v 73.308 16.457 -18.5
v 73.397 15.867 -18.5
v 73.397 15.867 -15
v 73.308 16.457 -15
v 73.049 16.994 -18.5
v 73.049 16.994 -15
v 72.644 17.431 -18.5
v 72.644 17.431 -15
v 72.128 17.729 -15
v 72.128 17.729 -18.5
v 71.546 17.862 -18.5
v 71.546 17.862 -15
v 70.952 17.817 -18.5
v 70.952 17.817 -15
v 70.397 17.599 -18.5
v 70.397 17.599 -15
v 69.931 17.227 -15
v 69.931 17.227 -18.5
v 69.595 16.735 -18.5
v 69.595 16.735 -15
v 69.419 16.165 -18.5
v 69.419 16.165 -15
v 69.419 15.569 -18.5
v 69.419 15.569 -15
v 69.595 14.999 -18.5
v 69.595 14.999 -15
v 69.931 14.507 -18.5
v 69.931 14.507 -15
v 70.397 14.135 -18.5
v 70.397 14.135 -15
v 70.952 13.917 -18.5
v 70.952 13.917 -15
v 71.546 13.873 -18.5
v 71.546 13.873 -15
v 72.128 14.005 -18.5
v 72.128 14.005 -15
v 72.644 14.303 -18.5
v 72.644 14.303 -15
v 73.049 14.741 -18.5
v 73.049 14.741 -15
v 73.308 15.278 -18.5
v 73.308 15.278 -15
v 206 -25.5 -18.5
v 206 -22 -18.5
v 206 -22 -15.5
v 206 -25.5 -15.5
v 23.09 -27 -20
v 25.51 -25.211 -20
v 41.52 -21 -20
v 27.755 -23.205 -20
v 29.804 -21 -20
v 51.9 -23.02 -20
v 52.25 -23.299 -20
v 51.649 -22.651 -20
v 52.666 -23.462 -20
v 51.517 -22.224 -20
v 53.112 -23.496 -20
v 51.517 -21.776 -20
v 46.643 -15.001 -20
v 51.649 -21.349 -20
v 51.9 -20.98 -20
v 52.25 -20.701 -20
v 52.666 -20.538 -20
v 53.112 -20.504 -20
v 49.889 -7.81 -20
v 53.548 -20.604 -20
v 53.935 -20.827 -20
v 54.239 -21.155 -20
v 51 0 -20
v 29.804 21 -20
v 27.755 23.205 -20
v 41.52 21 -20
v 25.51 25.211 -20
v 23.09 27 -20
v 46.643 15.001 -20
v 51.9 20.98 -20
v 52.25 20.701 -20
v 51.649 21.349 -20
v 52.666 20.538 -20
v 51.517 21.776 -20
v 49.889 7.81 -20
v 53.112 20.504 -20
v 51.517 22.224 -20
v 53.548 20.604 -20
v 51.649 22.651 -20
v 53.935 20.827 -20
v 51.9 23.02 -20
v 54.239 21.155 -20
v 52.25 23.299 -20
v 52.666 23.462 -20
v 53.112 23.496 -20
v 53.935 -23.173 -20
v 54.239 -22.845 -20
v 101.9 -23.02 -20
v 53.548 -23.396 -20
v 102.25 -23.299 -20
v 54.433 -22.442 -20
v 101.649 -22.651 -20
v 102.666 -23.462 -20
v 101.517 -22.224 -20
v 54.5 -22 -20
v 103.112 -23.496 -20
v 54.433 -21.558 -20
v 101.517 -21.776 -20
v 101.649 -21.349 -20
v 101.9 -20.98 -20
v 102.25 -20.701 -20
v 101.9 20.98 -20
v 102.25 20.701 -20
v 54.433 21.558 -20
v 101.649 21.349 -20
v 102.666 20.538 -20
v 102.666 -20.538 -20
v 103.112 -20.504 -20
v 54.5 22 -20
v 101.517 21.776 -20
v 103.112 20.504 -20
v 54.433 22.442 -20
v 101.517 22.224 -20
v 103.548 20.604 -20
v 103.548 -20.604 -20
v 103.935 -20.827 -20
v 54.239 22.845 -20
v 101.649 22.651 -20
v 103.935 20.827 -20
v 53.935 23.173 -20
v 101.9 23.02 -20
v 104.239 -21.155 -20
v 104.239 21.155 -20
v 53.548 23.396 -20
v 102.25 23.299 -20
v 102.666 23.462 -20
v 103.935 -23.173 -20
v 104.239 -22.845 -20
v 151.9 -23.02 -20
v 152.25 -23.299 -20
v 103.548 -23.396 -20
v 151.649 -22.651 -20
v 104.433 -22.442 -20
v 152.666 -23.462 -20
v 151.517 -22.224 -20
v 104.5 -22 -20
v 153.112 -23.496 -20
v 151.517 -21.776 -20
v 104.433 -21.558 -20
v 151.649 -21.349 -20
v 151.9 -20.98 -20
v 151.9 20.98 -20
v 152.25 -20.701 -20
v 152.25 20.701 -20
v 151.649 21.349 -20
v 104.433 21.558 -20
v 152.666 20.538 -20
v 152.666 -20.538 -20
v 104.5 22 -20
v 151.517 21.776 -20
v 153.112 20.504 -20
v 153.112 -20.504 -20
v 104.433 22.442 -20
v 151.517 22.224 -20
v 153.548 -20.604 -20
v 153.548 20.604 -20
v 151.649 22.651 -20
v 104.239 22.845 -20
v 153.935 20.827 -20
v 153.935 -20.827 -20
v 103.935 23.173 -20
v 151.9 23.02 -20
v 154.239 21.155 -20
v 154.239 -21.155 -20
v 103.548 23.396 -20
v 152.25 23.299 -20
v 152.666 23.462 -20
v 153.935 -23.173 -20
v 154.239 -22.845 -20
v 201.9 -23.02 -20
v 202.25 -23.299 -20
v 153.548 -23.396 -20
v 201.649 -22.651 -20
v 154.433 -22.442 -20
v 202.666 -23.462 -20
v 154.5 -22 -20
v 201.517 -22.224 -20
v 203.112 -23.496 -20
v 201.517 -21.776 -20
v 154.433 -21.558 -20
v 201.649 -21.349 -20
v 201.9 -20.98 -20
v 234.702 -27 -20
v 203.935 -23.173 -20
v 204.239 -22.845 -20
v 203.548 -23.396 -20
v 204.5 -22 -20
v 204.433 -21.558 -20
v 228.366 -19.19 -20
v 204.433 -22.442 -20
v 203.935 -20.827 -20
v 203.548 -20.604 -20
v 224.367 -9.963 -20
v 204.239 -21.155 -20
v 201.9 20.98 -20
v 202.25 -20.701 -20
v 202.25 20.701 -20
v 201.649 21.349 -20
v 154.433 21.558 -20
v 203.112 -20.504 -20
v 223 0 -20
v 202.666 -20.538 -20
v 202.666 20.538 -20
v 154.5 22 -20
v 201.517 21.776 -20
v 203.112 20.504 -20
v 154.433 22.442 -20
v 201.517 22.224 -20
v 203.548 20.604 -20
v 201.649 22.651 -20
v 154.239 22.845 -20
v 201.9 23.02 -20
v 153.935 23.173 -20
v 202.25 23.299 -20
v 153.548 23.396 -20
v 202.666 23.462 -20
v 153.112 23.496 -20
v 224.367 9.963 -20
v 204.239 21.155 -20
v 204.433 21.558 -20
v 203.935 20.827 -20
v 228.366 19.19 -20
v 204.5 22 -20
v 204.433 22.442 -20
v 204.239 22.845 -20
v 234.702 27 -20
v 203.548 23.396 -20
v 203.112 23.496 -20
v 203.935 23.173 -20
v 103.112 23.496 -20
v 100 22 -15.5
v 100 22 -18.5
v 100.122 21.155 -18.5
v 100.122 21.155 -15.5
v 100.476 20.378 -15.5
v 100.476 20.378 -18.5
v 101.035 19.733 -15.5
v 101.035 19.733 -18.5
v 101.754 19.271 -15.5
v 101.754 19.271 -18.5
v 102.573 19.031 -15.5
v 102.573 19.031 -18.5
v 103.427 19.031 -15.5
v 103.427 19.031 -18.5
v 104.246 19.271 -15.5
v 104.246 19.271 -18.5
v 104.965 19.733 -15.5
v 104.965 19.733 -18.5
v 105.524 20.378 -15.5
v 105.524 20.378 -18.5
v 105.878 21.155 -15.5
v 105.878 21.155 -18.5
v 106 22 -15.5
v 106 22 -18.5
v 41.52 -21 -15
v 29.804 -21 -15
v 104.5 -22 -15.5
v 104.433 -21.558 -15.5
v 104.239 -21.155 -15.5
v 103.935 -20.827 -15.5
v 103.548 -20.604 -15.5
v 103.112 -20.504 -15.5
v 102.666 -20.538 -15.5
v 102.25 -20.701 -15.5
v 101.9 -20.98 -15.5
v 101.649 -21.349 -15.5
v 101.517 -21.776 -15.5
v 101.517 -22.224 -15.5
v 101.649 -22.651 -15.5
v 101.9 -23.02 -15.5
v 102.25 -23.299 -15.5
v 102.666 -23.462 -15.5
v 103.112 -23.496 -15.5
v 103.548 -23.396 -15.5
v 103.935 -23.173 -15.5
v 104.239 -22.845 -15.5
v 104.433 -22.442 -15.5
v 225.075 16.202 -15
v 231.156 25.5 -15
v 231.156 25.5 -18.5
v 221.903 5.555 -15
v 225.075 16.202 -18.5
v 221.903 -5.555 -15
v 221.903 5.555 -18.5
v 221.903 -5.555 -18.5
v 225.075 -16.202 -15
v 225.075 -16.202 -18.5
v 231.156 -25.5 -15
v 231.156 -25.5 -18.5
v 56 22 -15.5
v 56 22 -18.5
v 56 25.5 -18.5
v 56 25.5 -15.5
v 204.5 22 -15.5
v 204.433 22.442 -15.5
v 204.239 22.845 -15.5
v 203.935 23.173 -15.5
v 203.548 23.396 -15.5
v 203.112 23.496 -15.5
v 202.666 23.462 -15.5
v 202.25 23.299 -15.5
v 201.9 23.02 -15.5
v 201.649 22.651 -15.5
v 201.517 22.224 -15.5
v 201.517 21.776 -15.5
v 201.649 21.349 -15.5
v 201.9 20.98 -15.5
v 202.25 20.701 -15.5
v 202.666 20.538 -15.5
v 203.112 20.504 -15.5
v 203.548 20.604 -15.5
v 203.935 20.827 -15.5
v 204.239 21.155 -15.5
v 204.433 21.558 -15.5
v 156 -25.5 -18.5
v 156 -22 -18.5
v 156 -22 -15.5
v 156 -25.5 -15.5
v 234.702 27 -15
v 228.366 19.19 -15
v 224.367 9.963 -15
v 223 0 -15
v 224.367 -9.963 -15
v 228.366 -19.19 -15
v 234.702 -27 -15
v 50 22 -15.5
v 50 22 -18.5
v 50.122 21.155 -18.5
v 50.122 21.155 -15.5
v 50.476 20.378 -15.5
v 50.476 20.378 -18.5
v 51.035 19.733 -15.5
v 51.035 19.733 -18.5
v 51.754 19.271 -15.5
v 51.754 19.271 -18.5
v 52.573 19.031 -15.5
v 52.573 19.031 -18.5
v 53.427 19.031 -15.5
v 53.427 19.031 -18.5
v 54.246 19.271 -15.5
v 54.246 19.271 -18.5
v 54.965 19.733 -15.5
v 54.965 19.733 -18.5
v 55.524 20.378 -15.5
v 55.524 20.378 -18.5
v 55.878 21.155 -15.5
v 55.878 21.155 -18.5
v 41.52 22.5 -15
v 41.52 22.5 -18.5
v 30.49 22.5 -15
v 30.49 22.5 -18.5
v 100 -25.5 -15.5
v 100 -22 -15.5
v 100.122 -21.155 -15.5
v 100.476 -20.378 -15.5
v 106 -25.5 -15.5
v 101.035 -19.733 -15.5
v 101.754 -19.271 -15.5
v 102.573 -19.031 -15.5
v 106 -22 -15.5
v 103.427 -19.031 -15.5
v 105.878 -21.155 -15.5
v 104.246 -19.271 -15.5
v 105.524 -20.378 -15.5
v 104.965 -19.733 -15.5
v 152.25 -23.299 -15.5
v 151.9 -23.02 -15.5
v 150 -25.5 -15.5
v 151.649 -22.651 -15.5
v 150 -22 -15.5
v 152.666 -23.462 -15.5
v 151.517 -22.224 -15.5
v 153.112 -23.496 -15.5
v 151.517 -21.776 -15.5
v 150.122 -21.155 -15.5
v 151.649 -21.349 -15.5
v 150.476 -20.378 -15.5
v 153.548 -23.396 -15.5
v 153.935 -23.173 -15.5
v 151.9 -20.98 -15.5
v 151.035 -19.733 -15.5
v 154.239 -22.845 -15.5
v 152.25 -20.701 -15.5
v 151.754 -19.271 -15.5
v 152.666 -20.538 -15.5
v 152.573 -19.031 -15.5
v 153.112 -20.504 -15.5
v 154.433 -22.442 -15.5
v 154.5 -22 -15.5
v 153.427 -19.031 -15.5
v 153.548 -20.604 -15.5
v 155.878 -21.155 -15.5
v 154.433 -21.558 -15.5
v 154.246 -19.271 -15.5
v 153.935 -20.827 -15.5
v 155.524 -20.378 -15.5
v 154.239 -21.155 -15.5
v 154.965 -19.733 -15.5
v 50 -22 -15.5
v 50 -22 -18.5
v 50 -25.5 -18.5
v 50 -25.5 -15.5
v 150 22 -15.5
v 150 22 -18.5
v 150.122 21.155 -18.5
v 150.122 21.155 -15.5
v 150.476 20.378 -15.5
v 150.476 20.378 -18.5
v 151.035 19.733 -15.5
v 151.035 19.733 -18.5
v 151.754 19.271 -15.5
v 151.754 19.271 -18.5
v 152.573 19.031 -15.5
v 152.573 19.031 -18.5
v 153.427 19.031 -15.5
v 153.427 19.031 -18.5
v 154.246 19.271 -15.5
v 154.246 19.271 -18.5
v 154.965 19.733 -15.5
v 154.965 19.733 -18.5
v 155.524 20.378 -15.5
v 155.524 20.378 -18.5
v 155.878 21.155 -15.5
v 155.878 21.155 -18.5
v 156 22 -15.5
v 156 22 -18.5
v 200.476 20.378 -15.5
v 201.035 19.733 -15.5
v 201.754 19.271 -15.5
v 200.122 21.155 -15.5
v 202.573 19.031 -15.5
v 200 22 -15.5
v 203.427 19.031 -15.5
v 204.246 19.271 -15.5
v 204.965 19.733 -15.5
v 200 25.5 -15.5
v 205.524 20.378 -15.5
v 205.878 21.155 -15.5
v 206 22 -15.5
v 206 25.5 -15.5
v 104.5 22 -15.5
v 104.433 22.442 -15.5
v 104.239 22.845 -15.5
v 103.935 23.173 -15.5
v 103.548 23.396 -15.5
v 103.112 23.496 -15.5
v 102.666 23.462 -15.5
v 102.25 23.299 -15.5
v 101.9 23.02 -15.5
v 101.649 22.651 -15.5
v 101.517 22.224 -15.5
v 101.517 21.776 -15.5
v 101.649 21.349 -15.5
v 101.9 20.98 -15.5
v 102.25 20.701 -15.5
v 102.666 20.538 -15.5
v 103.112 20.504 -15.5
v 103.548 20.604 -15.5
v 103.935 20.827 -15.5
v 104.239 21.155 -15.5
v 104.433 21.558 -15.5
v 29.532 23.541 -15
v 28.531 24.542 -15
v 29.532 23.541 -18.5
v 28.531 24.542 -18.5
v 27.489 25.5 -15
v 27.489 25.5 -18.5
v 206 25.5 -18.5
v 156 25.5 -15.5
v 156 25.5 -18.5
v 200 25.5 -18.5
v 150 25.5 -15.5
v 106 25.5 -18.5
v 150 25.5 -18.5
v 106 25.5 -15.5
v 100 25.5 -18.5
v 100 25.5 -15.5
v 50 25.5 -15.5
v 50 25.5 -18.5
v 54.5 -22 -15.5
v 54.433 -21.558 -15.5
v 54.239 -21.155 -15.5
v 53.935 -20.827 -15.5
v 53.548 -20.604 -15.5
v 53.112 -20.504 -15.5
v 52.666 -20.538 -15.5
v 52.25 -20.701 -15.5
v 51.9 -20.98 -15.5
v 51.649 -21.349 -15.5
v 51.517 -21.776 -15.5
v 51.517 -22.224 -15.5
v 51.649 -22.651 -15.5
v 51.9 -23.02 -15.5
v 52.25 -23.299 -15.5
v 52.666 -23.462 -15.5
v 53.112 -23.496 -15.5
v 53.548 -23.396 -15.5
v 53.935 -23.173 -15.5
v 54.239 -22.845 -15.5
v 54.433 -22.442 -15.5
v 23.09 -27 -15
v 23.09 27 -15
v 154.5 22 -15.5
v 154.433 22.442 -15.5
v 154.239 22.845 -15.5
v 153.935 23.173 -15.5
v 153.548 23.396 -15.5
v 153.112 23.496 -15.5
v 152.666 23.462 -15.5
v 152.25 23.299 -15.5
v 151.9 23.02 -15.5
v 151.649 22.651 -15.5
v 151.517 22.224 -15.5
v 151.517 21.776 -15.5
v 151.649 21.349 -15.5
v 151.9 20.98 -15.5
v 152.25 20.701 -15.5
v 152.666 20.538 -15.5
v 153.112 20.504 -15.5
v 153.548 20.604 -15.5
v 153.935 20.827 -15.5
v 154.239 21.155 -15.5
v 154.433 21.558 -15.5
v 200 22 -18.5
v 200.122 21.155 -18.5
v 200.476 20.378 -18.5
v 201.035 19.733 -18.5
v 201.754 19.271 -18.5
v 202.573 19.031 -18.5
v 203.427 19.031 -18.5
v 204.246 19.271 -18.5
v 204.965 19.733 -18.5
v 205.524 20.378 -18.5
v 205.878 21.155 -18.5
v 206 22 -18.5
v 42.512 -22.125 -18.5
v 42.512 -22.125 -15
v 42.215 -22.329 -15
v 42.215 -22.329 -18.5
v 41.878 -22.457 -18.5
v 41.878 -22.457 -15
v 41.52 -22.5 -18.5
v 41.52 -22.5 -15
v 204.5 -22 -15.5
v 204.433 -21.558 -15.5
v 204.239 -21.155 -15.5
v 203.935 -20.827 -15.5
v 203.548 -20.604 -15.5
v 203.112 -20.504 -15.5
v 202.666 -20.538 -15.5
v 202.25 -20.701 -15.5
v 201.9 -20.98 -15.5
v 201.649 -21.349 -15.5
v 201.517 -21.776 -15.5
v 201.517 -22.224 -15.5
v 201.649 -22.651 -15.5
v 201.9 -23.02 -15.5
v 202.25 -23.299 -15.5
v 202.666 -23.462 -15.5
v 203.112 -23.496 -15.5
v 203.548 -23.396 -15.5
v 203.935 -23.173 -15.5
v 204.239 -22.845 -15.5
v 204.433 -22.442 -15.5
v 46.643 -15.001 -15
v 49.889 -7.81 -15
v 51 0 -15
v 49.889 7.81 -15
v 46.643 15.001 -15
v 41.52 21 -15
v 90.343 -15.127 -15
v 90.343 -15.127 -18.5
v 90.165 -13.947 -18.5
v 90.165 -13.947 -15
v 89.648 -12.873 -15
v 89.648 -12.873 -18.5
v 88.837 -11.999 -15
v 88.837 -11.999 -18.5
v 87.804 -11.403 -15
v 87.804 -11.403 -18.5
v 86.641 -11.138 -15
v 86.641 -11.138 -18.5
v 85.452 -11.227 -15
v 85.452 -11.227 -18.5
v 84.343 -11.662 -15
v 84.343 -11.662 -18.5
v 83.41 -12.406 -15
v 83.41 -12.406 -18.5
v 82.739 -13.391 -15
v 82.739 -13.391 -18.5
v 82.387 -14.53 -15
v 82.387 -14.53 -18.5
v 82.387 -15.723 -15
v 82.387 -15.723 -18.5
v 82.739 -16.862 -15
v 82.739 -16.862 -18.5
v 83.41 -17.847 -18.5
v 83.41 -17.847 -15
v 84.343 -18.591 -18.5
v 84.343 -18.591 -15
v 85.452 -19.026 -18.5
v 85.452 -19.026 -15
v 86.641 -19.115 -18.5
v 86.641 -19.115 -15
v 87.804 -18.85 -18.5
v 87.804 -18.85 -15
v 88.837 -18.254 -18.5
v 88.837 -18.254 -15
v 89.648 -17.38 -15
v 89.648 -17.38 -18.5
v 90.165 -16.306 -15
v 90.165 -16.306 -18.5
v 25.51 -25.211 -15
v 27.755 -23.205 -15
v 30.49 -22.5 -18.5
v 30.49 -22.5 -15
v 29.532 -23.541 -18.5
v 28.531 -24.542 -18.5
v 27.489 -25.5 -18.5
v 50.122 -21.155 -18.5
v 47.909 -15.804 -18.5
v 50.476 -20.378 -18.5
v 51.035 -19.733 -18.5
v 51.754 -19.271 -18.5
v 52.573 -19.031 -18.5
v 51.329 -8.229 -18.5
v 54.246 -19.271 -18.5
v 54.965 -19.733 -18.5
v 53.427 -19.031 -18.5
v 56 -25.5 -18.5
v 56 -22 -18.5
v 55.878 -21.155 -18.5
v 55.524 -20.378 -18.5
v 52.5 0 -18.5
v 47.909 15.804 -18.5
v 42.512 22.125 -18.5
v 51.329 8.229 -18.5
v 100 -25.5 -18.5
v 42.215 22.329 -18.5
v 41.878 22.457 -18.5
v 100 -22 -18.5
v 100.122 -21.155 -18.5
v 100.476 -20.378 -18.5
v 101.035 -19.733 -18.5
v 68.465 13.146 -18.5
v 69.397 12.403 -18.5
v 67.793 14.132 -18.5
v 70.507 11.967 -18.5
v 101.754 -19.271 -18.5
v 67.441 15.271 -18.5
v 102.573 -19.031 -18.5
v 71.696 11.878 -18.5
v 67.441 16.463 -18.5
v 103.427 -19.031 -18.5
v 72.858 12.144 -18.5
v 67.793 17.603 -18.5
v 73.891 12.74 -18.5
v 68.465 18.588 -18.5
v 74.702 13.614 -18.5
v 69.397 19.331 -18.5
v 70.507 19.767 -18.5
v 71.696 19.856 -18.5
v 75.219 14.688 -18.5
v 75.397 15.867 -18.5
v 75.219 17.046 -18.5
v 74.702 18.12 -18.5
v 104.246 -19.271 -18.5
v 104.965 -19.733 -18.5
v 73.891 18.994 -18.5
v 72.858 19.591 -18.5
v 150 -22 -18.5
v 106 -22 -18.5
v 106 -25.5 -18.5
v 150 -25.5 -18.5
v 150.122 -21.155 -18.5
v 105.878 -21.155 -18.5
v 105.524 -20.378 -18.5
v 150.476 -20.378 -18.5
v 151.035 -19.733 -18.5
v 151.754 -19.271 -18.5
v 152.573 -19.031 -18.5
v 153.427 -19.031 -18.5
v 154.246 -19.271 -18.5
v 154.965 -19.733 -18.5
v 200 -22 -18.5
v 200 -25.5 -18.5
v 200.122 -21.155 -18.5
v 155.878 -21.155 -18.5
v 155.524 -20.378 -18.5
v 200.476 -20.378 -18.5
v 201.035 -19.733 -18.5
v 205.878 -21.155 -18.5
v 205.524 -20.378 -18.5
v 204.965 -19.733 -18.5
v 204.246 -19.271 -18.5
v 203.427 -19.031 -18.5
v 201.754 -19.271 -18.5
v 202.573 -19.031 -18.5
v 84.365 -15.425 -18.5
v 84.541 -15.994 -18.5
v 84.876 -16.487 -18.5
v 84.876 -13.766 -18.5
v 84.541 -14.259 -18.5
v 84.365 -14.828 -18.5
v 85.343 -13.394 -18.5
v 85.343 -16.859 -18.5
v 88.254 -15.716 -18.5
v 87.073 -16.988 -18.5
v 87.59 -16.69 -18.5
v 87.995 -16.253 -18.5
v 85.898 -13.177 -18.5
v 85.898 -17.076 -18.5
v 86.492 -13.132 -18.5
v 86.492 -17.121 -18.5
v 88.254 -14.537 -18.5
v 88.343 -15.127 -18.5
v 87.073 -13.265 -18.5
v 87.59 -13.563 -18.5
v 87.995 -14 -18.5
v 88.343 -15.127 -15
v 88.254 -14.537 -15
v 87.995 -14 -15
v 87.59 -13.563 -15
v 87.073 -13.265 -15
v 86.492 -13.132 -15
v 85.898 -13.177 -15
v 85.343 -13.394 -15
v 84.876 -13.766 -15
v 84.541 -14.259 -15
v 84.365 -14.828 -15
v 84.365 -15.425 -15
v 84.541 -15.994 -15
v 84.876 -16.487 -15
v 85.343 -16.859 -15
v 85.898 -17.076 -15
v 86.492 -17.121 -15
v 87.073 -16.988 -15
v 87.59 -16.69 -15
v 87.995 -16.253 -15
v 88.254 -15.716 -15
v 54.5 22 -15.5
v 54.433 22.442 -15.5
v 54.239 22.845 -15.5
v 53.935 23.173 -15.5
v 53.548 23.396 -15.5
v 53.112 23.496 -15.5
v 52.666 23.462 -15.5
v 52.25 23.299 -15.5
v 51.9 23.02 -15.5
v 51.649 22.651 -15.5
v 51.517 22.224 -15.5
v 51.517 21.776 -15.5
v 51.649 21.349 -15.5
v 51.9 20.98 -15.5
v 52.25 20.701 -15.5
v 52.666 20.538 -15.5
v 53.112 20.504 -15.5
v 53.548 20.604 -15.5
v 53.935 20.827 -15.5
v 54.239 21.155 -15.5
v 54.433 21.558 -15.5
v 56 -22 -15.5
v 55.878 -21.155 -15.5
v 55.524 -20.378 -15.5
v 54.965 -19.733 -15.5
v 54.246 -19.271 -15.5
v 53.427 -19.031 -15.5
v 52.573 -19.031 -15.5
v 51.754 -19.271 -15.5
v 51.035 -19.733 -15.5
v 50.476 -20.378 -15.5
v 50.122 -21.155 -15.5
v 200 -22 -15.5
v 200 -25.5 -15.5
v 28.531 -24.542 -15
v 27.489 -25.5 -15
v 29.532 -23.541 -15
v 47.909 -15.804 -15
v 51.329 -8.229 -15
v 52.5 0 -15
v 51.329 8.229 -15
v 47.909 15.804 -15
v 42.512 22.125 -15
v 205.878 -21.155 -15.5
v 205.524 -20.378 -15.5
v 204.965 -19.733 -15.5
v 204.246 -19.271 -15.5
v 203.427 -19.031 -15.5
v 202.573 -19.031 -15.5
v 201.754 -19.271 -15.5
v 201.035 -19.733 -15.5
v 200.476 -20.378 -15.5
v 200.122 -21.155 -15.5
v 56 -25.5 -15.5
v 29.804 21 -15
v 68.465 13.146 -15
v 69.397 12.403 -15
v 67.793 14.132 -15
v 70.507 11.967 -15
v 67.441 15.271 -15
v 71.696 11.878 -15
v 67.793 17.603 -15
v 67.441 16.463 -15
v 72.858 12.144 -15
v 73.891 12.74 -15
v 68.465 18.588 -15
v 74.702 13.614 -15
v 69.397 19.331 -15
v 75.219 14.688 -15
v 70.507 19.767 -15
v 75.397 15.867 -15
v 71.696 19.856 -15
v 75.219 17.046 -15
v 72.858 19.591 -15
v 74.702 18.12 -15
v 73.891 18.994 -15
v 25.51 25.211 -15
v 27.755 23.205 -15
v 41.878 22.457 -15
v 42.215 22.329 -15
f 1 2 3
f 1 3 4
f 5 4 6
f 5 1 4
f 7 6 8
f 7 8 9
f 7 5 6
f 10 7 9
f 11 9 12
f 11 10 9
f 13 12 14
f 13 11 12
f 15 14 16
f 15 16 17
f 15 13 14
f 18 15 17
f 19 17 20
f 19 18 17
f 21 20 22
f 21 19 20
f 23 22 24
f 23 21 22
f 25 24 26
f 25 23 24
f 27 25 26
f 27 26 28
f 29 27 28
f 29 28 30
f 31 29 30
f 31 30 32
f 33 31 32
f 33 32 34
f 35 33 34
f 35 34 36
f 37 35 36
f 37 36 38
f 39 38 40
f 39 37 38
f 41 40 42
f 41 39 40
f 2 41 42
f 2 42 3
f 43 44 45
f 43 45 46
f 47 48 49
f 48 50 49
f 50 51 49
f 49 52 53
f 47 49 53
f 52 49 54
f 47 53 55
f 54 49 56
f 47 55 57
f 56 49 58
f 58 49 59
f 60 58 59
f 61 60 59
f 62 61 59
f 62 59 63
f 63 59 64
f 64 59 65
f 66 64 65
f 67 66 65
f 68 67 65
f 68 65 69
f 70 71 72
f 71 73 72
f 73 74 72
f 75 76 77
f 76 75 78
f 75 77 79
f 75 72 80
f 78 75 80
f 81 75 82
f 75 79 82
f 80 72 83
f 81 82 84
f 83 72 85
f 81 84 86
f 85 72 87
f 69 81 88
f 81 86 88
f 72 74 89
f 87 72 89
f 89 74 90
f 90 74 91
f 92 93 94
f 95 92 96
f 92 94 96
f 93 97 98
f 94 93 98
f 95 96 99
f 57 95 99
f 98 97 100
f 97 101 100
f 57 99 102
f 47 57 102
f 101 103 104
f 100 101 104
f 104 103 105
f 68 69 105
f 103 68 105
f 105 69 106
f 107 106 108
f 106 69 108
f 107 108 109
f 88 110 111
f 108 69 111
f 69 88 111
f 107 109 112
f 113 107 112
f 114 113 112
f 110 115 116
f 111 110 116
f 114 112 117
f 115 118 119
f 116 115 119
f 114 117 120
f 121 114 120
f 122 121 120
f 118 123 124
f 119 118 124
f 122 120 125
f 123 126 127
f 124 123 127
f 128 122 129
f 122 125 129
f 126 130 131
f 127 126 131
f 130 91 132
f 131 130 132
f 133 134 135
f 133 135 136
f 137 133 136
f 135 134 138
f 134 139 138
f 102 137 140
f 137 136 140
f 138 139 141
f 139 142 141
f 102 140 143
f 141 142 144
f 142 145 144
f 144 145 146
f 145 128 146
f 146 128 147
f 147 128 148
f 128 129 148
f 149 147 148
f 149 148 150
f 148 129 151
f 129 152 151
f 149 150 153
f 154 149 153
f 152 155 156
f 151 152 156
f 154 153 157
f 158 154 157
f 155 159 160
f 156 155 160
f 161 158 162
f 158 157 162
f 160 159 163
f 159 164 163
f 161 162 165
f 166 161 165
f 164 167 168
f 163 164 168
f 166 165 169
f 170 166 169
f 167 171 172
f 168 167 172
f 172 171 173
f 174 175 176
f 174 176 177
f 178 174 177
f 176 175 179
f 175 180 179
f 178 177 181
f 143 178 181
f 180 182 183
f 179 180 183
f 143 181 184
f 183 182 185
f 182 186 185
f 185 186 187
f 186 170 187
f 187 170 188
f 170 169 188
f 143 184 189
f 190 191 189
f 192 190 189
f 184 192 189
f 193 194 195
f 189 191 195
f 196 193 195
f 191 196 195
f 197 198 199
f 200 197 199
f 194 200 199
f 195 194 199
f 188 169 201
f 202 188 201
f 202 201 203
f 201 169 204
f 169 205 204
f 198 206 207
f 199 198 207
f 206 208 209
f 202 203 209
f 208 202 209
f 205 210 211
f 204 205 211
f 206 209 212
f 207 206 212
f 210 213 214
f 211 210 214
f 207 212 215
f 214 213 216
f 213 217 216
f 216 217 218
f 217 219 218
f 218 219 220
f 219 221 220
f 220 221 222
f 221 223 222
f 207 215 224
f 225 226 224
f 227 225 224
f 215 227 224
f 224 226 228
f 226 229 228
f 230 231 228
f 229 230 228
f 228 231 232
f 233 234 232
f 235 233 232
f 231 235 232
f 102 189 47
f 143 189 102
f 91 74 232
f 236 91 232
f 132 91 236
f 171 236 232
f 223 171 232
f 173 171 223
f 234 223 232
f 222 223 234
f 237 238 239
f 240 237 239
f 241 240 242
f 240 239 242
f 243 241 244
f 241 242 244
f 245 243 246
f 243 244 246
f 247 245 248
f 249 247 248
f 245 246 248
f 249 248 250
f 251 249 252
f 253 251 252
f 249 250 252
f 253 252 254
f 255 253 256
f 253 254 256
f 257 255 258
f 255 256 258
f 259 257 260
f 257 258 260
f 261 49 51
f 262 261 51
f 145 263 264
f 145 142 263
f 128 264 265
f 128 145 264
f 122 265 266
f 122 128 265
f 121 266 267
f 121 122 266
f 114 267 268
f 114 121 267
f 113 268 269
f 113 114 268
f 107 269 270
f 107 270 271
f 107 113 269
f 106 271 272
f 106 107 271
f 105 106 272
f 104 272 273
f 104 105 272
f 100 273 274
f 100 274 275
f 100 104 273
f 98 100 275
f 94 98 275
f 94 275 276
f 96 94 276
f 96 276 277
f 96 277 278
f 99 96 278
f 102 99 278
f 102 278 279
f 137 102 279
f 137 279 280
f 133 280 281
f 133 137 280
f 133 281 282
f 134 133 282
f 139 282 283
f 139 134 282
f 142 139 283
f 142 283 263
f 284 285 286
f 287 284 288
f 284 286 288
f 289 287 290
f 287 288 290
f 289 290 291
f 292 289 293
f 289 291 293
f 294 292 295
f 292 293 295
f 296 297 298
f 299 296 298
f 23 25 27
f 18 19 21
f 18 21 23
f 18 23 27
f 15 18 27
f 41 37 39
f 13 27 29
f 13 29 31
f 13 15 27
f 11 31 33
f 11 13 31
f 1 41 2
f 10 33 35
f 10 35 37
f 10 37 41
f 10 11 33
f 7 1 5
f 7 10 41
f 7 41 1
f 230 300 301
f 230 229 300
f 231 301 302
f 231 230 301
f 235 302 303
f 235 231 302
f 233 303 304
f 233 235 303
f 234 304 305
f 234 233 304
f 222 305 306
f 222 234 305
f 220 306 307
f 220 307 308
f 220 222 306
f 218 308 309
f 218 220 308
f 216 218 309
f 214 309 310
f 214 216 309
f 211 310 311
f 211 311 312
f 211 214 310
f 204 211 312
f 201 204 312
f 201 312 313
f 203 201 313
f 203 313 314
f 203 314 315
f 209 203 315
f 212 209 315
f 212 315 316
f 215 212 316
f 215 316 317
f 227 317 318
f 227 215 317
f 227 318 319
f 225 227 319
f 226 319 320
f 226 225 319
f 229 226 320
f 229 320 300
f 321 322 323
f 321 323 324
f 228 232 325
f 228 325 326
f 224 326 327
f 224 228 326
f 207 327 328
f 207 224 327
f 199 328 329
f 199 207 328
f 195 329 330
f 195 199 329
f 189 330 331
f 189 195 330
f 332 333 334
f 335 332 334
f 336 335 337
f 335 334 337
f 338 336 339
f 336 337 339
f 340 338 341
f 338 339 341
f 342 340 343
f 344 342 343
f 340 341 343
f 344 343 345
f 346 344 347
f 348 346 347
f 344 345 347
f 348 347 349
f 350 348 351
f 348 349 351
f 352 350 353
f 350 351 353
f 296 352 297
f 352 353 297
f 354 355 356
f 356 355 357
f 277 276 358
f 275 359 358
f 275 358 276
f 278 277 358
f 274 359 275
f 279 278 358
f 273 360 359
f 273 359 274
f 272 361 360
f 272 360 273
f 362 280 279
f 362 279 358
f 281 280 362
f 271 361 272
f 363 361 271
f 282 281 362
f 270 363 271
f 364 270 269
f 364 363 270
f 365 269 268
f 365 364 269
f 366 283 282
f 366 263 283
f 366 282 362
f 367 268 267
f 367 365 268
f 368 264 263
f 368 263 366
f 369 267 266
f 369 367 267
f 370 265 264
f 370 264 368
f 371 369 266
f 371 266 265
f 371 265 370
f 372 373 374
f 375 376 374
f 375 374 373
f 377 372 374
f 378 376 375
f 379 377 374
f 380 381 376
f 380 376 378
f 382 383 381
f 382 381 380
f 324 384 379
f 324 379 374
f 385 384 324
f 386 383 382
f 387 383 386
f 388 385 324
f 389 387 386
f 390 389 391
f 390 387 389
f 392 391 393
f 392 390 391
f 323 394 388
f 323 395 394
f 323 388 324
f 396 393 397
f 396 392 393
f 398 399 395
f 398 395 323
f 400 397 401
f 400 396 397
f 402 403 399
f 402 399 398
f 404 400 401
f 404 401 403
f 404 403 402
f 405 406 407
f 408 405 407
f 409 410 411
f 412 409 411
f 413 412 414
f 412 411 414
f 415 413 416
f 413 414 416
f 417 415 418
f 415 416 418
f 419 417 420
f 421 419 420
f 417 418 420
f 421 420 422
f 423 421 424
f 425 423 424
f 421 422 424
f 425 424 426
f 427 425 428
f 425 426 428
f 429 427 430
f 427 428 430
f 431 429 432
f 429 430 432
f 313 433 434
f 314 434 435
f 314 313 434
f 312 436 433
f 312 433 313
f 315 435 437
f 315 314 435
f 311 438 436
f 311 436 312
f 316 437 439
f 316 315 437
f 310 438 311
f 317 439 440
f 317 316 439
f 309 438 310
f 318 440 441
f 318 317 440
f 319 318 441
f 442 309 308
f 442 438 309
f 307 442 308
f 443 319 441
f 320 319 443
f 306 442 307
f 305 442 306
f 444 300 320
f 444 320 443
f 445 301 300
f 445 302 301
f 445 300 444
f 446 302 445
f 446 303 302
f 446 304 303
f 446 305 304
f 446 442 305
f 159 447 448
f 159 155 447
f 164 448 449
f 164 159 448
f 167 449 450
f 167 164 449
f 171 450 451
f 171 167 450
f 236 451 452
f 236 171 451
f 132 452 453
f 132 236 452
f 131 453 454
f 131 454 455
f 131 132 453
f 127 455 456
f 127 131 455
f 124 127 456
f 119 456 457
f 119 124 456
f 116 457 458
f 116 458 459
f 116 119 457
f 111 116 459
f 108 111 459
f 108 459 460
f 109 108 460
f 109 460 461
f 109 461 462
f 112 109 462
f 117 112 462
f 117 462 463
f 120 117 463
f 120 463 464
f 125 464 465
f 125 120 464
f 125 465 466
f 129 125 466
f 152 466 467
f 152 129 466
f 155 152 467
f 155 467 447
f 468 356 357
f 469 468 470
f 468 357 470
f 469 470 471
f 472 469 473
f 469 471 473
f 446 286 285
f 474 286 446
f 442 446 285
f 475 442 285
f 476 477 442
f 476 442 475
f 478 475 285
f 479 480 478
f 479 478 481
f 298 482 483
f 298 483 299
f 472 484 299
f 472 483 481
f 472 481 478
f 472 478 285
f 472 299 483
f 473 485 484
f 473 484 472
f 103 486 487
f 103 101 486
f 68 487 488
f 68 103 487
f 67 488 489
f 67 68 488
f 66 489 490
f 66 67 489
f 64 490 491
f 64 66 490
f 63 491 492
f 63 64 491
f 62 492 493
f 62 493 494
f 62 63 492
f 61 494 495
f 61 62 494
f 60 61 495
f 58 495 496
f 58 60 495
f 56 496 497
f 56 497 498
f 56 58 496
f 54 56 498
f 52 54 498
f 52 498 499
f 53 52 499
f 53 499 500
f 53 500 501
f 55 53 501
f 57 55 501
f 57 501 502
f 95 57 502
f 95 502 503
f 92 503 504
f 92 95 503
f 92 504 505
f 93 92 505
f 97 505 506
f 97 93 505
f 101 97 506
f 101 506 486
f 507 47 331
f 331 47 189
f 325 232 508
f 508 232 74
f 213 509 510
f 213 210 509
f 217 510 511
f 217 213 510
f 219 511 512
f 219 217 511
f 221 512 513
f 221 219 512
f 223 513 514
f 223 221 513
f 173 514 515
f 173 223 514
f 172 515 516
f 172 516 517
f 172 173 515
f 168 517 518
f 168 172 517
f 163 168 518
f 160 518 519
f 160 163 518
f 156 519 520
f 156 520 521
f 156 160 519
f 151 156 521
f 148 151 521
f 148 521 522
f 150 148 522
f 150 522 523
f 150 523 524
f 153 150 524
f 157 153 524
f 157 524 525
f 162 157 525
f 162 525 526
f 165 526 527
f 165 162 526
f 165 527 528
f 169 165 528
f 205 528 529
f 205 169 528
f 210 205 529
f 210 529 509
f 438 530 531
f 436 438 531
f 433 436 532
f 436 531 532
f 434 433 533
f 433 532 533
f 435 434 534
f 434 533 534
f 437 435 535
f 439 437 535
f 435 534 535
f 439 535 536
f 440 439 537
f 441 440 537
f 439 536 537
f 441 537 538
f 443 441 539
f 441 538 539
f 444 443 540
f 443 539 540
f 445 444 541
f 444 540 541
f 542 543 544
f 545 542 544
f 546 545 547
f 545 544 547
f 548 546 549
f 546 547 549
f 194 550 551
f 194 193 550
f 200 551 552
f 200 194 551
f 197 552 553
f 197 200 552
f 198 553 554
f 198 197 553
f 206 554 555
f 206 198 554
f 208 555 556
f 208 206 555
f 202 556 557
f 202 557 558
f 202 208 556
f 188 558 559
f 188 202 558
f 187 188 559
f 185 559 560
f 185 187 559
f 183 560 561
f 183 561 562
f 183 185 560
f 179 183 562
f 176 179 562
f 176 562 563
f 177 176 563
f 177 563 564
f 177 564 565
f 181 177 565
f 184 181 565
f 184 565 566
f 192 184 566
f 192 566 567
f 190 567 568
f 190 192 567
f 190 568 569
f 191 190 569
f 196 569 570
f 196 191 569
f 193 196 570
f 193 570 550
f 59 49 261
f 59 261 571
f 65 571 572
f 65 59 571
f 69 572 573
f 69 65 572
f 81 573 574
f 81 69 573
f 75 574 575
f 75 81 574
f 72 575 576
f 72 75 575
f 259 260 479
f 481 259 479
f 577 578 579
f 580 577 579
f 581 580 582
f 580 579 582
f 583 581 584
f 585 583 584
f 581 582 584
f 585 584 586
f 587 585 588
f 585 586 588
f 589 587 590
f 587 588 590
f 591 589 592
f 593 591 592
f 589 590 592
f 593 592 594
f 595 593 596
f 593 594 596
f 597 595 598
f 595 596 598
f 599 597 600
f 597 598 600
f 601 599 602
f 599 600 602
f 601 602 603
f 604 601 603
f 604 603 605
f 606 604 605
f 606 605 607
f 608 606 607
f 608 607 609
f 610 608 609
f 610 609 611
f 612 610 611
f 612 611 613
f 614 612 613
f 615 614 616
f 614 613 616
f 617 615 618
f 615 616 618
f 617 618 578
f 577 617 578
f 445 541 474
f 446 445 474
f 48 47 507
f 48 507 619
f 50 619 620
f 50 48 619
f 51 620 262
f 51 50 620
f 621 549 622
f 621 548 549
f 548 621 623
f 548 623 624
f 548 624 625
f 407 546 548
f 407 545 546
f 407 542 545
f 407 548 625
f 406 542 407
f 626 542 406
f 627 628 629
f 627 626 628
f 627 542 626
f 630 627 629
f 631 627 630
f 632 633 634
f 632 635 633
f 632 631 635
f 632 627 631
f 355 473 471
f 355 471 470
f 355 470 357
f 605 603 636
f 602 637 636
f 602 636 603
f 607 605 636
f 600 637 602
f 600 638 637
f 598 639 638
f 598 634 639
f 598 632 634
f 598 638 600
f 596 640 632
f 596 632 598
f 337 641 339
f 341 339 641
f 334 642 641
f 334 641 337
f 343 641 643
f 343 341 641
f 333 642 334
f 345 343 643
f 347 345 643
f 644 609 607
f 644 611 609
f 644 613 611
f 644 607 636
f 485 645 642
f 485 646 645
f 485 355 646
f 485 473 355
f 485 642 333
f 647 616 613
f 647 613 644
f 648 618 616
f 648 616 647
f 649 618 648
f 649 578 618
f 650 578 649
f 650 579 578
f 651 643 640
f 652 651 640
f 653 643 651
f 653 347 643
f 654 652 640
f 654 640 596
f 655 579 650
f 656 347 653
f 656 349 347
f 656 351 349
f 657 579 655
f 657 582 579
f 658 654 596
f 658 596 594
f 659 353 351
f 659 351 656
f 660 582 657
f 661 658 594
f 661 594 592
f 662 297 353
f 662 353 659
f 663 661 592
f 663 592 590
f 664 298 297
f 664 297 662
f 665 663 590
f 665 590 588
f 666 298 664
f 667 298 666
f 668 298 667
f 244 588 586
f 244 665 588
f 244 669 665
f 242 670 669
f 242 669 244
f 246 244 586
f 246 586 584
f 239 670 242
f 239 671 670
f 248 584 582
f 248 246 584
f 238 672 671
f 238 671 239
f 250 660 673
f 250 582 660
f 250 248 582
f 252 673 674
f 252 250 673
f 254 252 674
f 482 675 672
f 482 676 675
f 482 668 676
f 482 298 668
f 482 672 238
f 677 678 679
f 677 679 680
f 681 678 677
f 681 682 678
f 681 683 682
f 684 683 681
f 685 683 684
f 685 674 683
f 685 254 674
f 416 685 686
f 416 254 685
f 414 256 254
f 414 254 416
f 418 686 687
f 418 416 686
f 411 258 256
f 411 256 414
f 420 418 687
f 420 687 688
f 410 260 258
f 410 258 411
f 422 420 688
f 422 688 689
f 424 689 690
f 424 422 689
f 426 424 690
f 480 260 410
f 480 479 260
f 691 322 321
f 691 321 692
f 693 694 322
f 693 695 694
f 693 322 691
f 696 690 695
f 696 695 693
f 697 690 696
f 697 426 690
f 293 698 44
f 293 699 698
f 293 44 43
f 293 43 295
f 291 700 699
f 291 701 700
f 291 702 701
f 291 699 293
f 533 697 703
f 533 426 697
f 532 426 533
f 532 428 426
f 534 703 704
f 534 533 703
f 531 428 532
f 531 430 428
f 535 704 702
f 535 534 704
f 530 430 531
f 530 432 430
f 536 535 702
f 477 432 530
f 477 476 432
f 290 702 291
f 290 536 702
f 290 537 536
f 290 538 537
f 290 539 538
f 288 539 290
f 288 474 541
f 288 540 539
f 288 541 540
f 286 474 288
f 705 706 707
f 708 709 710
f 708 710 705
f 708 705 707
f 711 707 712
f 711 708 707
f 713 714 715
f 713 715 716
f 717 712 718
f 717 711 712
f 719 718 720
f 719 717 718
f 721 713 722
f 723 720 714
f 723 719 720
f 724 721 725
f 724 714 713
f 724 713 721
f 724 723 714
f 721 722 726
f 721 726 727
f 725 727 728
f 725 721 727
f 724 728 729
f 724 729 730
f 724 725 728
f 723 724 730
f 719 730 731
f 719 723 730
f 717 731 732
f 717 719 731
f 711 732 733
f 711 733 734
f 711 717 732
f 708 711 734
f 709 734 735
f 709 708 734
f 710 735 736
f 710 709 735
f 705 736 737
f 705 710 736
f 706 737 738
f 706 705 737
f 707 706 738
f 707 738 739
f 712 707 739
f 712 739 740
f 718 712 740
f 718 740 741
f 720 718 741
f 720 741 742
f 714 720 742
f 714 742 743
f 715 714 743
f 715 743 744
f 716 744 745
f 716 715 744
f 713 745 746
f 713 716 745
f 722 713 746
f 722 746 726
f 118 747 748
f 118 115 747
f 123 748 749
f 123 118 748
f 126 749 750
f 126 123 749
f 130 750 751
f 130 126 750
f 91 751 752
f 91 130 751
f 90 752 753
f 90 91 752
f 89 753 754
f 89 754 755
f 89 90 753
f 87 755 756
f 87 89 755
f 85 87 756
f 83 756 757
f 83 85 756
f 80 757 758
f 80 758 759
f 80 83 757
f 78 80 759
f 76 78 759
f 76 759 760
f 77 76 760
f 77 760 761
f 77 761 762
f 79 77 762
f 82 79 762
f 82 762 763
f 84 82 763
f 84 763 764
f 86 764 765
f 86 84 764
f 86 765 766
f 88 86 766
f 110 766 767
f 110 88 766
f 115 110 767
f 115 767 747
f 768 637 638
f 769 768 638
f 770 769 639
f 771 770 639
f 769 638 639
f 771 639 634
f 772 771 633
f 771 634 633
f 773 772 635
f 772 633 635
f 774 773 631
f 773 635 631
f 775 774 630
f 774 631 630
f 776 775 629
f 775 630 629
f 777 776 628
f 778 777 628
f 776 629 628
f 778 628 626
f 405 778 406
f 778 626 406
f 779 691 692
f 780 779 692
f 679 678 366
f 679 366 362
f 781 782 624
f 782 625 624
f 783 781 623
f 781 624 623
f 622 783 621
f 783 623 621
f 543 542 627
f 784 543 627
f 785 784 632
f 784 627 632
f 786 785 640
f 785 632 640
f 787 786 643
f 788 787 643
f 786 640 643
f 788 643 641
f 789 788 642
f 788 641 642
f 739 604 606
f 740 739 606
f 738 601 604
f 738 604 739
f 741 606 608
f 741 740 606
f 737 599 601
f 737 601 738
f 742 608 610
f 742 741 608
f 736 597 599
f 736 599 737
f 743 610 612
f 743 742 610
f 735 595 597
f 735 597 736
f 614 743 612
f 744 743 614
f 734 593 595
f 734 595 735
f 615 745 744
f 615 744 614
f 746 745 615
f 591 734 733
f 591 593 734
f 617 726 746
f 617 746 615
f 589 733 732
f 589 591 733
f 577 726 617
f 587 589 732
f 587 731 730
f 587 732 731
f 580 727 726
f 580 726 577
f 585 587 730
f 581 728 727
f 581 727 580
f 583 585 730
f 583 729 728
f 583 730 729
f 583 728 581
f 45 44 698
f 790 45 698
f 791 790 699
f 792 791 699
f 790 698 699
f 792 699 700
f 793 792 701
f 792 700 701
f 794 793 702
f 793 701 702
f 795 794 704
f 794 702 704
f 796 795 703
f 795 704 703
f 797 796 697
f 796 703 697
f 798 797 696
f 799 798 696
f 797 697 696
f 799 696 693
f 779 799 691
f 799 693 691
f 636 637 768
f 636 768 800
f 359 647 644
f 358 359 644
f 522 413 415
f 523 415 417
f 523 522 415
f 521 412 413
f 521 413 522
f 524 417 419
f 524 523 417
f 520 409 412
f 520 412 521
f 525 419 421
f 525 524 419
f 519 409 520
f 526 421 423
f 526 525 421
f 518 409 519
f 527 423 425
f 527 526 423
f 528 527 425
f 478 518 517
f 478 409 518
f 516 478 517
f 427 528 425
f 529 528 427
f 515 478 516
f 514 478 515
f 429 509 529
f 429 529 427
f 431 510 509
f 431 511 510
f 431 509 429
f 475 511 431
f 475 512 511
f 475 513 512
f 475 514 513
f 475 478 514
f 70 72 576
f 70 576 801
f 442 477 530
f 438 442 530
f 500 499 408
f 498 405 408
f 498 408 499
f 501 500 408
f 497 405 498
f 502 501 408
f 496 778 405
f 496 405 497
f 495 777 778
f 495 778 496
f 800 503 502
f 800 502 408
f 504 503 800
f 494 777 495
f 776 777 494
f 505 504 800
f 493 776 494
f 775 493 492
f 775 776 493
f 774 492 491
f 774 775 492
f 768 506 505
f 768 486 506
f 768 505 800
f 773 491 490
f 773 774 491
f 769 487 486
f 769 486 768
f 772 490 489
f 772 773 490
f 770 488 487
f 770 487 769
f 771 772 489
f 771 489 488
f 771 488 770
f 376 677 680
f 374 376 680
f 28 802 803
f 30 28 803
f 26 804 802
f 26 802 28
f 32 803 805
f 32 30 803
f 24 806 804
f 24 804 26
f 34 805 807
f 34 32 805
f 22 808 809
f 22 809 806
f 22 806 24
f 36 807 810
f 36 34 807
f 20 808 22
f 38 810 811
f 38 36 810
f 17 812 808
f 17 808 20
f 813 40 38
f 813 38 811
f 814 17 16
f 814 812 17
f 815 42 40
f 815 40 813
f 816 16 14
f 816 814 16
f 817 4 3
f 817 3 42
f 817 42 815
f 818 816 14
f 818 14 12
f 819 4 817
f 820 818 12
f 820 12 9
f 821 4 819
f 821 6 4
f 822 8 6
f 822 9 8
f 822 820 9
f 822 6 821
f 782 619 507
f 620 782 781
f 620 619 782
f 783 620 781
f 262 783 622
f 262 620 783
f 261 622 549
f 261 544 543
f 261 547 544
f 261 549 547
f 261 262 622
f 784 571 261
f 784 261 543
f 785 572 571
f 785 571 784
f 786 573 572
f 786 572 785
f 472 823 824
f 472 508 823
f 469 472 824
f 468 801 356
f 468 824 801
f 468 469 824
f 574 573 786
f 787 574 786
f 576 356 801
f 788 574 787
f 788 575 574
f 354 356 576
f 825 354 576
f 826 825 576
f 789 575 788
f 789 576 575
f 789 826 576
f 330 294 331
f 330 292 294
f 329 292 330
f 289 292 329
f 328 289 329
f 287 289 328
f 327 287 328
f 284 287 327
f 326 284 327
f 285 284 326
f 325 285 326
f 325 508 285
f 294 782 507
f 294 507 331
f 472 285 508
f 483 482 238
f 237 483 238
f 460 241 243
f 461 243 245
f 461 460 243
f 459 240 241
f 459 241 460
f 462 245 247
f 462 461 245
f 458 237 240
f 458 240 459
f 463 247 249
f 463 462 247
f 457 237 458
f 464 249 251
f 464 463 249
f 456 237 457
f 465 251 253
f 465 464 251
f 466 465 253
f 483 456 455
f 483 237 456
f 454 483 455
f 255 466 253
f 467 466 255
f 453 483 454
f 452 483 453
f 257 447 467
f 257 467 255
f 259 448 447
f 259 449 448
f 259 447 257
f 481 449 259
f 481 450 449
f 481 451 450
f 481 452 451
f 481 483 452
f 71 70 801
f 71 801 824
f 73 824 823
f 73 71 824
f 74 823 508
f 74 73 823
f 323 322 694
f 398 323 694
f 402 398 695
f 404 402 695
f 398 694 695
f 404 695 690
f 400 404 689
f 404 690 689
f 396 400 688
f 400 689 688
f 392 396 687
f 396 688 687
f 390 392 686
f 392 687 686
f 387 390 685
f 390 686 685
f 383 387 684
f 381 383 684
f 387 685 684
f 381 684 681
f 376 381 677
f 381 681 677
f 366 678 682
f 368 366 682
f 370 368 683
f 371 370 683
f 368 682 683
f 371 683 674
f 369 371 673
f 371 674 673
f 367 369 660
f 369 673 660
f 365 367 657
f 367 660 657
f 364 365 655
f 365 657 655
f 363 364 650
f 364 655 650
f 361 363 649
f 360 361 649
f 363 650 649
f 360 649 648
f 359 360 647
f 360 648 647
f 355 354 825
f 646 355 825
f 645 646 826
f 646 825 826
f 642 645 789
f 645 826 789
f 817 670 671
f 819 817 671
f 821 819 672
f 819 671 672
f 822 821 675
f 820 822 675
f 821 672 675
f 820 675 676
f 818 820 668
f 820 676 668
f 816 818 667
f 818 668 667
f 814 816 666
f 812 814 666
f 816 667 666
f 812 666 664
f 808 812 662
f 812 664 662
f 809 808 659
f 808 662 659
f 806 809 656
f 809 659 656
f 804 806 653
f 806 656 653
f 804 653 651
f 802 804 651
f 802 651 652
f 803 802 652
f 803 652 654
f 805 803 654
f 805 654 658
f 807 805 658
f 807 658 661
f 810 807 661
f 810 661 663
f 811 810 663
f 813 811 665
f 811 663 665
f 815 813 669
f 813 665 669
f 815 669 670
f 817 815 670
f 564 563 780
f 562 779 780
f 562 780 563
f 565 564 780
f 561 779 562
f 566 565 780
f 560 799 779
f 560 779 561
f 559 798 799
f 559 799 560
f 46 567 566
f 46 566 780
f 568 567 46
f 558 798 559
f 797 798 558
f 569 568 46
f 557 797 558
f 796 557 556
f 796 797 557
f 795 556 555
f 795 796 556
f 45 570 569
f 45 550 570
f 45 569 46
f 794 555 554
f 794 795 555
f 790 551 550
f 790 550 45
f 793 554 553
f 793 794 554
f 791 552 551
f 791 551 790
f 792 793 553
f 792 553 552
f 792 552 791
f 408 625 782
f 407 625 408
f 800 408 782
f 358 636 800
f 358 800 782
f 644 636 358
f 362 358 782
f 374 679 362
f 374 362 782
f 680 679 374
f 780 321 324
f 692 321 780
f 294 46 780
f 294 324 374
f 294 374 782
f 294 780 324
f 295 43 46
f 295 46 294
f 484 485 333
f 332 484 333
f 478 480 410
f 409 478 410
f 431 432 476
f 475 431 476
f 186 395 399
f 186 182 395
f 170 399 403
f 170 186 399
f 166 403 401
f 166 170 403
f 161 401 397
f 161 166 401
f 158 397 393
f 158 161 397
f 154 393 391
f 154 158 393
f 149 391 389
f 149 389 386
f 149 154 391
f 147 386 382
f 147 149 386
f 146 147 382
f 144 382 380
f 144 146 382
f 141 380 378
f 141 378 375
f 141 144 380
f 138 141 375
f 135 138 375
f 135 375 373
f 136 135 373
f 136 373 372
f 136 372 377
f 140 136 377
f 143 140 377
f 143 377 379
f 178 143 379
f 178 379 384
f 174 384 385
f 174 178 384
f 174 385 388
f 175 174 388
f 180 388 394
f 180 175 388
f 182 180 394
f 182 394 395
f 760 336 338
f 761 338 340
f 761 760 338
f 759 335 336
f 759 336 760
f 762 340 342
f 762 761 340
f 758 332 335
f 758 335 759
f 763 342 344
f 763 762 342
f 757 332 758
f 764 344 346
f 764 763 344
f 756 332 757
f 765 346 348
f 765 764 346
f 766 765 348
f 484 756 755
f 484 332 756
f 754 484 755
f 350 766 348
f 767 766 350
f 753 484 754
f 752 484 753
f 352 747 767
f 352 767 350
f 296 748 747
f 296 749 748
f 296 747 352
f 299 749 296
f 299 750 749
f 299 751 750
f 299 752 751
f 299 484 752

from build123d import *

# Parameters (mm, degrees)
PAD039_DEPTH           = 5
THICKNESS001_T         = -1.5
SKETCH099_R            = 1.5
POCKET045_DEPTH        = 5
SKETCH100_R            = 1.5
PAD040_DEPTH           = 3
LINEARPATTERN001_COUNT = 4
LINEARPATTERN001_PITCH = 50
SKETCH102_R            = 4
SKETCH102_R_2          = 2
PAD041_DEPTH           = 3.5


with BuildPart() as part:
    # Sketch098 → Pad039 (new body)
    with BuildSketch(Plane.XY):
        with BuildLine():
            Line((18.090053, -27), (229.701779, -27))
            ThreePointArc((229.701779, 27), (218, 0), (229.701779, -27))
            Line((229.701779, 27), (18.090053, 27))
            ThreePointArc((24.804234, 21), (21.655945, 24.233655), (18.090053, 27))
            Line((36.520259, 21), (24.804234, 21))
            ThreePointArc((36.520259, -21), (46, 0), (36.520259, 21))
            Line((36.520259, -21), (24.804234, -21))
            ThreePointArc((18.090053, -27), (21.655945, -24.233655), (24.804234, -21))
        make_face()
    extrude(amount=PAD039_DEPTH)

    # Thickness001
    thickness001_openings = [part.faces().sort_by_distance(p)[0] for p in [
        (129.781402, 0, 5),
    ]]
    offset(amount=THICKNESS001_T, openings=thickness001_openings)

    # Sketch099 (on Face9 of Pad039) → Pocket045 (cut)
    with BuildSketch(Plane(origin=(0, 0, 0), x_dir=(1, 0, 0), z_dir=(0, 0, -1))):
        with Locations((48, 22)):
            Circle(SKETCH099_R)
        with Locations((48, -22)):
            Circle(SKETCH099_R)
    pocket045 = extrude(amount=-POCKET045_DEPTH, mode=Mode.SUBTRACT)

    # Sketch100 (on Face23 of Pocket045) → Pad040 (join)
    with BuildSketch(Plane.XY.offset(1.5)):
        with BuildLine():
            ThreePointArc((45, 22), (48.000011, 19), (51, 22.000022))
            Line((51, 22.000022), (51, 25.5))
            Line((45, 25.5), (51, 25.5))
            Line((45, 25.5), (45, 22))
        make_face()
        with Locations((48, 22)):
            Circle(SKETCH100_R, mode=Mode.SUBTRACT)
        with BuildLine():
            ThreePointArc((51, -22), (48, -19), (45, -22))
            Line((45, -22), (45, -25.5))
            Line((45, -25.5), (51, -25.5))
            Line((51, -22), (51, -25.5))
        make_face()
        with Locations((48, -22)):
            Circle(SKETCH100_R, mode=Mode.SUBTRACT)
    pad040 = extrude(amount=PAD040_DEPTH)

    # LinearPattern001: Pocket045, Pad040 ×4
    with Locations(*[(i * LINEARPATTERN001_PITCH, 0, 0) for i in range(1, LINEARPATTERN001_COUNT)]):
        add(pocket045, mode=Mode.SUBTRACT)
        add(pad040)

    # Sketch102 (on Face25 of LinearPattern001) → Pad041 (join)
    with BuildSketch(Plane.XY.offset(1.5)):
        with Locations((66.39682, 15.867146)):
            Circle(SKETCH102_R)
        with Locations((66.39682, 15.867146)):
            Circle(SKETCH102_R_2, mode=Mode.SUBTRACT)
        with Locations((81.342545, -15.126509)):
            Circle(SKETCH102_R)
        with Locations((81.342545, -15.126509)):
            Circle(SKETCH102_R_2, mode=Mode.SUBTRACT)
    extrude(amount=PAD041_DEPTH)


with BuildPart() as part_1:
    # Body011 placement: moved
    add(part.part.moved(Location((5, 0, -20))))


solid = part_1.part
